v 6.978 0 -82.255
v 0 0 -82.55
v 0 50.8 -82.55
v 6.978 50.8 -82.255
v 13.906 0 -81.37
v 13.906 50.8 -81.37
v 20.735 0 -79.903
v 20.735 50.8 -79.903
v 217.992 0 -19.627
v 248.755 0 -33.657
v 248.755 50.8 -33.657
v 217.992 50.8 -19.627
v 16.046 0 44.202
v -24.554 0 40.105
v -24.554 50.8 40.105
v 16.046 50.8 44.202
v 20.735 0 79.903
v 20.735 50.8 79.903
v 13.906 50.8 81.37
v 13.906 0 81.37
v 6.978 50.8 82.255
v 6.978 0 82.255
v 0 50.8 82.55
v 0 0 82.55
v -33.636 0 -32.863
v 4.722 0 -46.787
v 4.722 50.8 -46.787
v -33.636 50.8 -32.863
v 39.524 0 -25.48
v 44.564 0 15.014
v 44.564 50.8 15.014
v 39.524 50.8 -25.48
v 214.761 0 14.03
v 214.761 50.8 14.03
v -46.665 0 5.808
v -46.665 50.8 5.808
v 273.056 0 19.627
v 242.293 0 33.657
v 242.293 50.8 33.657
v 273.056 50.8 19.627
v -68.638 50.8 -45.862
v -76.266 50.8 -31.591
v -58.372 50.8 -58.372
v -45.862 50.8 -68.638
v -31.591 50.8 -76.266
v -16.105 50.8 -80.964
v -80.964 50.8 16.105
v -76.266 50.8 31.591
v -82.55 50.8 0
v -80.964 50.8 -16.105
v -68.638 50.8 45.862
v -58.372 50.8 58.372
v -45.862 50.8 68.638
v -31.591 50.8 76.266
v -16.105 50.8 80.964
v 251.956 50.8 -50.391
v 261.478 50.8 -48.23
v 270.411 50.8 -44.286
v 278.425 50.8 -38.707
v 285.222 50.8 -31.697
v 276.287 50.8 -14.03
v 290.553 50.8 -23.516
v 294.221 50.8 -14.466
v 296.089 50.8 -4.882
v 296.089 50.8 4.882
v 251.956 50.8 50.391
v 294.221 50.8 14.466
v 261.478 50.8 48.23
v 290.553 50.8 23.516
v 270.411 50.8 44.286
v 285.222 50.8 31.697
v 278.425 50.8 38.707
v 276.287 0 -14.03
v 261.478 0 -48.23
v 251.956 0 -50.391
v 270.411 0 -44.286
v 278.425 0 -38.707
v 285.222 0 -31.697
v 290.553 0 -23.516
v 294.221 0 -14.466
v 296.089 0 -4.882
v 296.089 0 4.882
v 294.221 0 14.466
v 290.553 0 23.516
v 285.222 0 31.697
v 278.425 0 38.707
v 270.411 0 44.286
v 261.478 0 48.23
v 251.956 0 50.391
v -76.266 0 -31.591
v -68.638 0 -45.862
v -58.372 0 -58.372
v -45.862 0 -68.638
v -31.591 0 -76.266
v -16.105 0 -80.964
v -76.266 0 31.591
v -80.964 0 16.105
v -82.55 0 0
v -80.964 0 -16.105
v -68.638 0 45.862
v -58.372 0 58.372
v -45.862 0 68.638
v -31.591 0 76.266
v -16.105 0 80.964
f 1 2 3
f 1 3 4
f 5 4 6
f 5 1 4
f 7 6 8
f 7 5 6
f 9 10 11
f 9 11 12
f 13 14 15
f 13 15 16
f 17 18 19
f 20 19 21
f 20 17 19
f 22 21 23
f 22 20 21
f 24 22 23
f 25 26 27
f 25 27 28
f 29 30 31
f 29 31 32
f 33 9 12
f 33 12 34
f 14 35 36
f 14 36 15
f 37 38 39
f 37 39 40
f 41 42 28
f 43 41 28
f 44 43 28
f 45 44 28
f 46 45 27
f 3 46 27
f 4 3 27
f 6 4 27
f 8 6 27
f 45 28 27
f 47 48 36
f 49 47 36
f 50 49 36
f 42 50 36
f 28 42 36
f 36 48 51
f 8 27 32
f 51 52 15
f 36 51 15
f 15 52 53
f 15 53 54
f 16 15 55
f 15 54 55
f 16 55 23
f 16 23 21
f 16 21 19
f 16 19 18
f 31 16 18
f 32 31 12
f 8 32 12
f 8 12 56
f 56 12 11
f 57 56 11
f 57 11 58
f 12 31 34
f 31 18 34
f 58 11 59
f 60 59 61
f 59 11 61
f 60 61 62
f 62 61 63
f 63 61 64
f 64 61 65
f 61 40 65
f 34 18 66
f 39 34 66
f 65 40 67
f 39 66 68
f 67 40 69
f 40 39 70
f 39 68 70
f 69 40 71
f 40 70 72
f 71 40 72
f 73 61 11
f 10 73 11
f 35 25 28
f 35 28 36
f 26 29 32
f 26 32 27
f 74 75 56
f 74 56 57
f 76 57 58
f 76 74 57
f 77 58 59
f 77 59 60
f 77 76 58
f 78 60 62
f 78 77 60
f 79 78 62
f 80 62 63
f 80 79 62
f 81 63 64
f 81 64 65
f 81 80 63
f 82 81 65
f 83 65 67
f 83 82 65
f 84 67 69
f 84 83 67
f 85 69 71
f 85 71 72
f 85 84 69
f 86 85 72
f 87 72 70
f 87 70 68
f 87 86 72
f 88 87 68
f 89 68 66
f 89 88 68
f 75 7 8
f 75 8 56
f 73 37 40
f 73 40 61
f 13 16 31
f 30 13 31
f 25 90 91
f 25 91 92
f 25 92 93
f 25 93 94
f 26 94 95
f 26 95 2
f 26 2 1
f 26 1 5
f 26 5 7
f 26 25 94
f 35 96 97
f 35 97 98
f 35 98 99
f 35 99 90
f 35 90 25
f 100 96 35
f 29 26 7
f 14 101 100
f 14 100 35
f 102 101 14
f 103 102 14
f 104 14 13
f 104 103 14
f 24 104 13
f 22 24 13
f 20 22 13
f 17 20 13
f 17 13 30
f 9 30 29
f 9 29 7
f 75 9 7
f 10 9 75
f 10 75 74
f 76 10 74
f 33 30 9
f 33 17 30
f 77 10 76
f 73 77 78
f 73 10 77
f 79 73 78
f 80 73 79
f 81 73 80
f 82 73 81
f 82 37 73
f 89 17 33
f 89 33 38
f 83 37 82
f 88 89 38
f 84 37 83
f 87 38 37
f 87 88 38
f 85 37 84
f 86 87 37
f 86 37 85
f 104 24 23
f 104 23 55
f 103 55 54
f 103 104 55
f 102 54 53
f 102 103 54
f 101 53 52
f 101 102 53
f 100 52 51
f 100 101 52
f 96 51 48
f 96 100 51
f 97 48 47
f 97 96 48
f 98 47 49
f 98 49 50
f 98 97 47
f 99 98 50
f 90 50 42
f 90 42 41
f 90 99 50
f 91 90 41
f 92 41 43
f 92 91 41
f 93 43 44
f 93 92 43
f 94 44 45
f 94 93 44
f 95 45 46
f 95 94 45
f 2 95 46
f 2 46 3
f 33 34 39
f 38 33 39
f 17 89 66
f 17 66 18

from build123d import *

# Parameters (mm, degrees)
F1_DEPTH = 50.8


# Not quite as in the source:
# - a feature names something its author has since deleted; it is built from what else it names


with BuildPart() as f1:
    # F0 (on Front) → F1 (new body)
    with BuildSketch(Plane.XZ):
        with BuildLine():
            Line((20.7350080501, 79.903453875), (0, 82.55))
            ThreePointArc((0, 82.55), (-82.55, 0), (0, -82.55))
            Line((0, -82.55), (20.7350080501, -79.903453875))
            ThreePointArc((20.7350080501, -79.903453875), (65.2923326836, -50.511521386), (82.55, 0))
            ThreePointArc((82.55, 0), (65.2923326836, 50.511521386), (20.7350080501, 79.903453875))
        make_face()
        Polygon((44.563520115, 15.0143387373), (39.5235830399, -25.4798759112), (4.7215818015, -46.7872243038), (-33.6358668361, -32.8628385102), (-46.6648216995, 5.8079349613), (-24.5542140343, 40.1052149467), (16.0462176134, 44.2024500799), align=None, mode=Mode.SUBTRACT)
        with BuildLine():
            ThreePointArc((20.7350080501, 79.903453875), (10.4516119, 81.8856905002), (0, 82.55))
            Line((0, 82.55), (20.7350080501, 79.903453875))
        make_face()
        with BuildLine():
            Line((20.7350080501, -79.903453875), (0, -82.55))
            ThreePointArc((0, -82.55), (10.4516119, -81.8856905002), (20.7350080501, -79.903453875))
        make_face()
        with BuildLine():
            Line((251.9559707698, 50.391194154), (20.7350080501, 79.903453875))
            ThreePointArc((20.7350080501, 79.903453875), (65.2923326836, 50.511521386), (82.55, 0))
            ThreePointArc((82.55, 0), (65.2923326836, -50.511521386), (20.7350080501, -79.903453875))
            Line((20.7350080501, -79.903453875), (251.9559707698, -50.391194154))
            ThreePointArc((251.9559707698, -50.391194154), (194.7242096006, 0), (251.9559707698, 50.391194154))
        make_face()
        with BuildLine():
            ThreePointArc((296.3242096006, 0), (283.6514535831, 33.5701246096), (251.9559707698, 50.391194154))
            ThreePointArc((251.9559707698, 50.391194154), (194.7242096006, 0), (251.9559707698, -50.391194154))
            ThreePointArc((251.9559707698, -50.391194154), (283.6514535831, -33.5701246096), (296.3242096006, 0))
        make_face()
        Polygon((273.0559987523, 19.6265456703), (276.2871913154, -14.0299559819), (248.7554021637, -33.6565016521), (217.9924204489, -19.6265456703), (214.7612278858, 14.0299559819), (242.2930170375, 33.6565016521), align=None, mode=Mode.SUBTRACT)
    extrude(amount=-F1_DEPTH)


solid = f1.part
